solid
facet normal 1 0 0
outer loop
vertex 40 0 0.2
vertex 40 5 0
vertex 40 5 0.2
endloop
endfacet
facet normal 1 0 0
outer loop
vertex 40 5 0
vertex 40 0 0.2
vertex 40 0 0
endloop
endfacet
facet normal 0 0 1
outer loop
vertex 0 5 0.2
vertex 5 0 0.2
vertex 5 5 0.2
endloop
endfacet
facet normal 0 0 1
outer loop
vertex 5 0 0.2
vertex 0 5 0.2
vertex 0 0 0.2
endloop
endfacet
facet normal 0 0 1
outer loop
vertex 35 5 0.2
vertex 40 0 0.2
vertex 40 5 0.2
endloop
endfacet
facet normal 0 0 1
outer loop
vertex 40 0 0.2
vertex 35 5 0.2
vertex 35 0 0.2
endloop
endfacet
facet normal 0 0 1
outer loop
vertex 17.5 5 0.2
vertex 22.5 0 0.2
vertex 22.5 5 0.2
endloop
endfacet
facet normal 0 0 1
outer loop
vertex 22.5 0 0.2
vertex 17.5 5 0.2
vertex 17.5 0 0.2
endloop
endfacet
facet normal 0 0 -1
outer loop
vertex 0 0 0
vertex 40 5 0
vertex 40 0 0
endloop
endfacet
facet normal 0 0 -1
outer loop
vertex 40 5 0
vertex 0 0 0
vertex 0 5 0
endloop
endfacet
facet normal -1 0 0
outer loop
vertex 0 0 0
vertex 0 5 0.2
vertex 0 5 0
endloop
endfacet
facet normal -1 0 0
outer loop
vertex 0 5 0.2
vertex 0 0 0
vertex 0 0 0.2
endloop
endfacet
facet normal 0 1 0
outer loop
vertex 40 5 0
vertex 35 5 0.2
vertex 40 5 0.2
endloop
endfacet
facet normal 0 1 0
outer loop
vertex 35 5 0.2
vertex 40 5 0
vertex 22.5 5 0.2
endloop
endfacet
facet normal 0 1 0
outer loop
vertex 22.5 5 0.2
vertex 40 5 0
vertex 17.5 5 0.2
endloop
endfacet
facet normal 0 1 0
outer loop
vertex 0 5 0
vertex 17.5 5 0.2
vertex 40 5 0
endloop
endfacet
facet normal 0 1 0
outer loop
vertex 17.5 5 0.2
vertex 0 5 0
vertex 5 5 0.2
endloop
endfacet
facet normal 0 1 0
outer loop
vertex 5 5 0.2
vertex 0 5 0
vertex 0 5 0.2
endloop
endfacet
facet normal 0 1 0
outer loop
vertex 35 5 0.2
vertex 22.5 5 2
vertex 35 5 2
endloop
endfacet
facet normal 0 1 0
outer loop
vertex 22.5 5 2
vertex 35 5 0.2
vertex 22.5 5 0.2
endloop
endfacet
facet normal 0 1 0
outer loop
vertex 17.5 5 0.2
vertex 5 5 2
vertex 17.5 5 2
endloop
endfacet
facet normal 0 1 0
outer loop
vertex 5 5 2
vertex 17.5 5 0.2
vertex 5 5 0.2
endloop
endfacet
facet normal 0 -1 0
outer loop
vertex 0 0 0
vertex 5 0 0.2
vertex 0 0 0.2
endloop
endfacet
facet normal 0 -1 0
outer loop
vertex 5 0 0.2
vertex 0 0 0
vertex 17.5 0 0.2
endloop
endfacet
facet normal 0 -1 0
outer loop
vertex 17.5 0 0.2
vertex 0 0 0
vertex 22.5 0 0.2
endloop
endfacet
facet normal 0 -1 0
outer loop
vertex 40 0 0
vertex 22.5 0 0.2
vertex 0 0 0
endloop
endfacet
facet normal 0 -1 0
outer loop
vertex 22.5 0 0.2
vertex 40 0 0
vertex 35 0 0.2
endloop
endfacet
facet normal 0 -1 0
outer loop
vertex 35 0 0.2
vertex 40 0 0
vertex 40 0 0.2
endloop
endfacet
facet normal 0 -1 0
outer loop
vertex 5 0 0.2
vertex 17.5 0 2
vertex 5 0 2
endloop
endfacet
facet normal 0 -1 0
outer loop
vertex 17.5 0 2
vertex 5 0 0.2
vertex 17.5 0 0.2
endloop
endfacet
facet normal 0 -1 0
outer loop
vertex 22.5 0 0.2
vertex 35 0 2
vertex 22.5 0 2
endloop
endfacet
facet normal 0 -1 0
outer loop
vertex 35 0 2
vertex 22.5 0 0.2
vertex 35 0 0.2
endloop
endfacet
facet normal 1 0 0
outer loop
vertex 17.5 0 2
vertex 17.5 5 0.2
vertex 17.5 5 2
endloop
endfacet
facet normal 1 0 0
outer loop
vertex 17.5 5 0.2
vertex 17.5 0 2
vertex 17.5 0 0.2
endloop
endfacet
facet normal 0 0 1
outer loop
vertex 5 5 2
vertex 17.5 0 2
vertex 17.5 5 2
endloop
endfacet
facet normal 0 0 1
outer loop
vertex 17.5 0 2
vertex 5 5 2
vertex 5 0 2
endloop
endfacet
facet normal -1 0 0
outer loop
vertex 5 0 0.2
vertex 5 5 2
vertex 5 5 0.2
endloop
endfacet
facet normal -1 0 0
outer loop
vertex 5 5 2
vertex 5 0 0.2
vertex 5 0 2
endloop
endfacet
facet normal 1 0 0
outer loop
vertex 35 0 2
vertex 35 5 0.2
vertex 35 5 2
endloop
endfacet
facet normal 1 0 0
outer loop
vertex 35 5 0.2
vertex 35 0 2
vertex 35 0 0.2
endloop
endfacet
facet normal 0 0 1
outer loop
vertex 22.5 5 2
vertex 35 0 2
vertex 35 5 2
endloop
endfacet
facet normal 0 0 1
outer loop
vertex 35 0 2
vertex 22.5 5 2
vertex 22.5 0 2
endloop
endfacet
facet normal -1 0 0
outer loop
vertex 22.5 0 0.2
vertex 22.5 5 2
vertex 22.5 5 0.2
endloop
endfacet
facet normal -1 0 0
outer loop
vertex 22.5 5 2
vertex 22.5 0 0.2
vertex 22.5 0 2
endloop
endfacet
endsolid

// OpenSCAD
cube([40,5,0.2]);
 translate([5,0,0]) cube([12.5,5,2]);
 translate([22.5,0,0]) cube([12.5,5,2]);
